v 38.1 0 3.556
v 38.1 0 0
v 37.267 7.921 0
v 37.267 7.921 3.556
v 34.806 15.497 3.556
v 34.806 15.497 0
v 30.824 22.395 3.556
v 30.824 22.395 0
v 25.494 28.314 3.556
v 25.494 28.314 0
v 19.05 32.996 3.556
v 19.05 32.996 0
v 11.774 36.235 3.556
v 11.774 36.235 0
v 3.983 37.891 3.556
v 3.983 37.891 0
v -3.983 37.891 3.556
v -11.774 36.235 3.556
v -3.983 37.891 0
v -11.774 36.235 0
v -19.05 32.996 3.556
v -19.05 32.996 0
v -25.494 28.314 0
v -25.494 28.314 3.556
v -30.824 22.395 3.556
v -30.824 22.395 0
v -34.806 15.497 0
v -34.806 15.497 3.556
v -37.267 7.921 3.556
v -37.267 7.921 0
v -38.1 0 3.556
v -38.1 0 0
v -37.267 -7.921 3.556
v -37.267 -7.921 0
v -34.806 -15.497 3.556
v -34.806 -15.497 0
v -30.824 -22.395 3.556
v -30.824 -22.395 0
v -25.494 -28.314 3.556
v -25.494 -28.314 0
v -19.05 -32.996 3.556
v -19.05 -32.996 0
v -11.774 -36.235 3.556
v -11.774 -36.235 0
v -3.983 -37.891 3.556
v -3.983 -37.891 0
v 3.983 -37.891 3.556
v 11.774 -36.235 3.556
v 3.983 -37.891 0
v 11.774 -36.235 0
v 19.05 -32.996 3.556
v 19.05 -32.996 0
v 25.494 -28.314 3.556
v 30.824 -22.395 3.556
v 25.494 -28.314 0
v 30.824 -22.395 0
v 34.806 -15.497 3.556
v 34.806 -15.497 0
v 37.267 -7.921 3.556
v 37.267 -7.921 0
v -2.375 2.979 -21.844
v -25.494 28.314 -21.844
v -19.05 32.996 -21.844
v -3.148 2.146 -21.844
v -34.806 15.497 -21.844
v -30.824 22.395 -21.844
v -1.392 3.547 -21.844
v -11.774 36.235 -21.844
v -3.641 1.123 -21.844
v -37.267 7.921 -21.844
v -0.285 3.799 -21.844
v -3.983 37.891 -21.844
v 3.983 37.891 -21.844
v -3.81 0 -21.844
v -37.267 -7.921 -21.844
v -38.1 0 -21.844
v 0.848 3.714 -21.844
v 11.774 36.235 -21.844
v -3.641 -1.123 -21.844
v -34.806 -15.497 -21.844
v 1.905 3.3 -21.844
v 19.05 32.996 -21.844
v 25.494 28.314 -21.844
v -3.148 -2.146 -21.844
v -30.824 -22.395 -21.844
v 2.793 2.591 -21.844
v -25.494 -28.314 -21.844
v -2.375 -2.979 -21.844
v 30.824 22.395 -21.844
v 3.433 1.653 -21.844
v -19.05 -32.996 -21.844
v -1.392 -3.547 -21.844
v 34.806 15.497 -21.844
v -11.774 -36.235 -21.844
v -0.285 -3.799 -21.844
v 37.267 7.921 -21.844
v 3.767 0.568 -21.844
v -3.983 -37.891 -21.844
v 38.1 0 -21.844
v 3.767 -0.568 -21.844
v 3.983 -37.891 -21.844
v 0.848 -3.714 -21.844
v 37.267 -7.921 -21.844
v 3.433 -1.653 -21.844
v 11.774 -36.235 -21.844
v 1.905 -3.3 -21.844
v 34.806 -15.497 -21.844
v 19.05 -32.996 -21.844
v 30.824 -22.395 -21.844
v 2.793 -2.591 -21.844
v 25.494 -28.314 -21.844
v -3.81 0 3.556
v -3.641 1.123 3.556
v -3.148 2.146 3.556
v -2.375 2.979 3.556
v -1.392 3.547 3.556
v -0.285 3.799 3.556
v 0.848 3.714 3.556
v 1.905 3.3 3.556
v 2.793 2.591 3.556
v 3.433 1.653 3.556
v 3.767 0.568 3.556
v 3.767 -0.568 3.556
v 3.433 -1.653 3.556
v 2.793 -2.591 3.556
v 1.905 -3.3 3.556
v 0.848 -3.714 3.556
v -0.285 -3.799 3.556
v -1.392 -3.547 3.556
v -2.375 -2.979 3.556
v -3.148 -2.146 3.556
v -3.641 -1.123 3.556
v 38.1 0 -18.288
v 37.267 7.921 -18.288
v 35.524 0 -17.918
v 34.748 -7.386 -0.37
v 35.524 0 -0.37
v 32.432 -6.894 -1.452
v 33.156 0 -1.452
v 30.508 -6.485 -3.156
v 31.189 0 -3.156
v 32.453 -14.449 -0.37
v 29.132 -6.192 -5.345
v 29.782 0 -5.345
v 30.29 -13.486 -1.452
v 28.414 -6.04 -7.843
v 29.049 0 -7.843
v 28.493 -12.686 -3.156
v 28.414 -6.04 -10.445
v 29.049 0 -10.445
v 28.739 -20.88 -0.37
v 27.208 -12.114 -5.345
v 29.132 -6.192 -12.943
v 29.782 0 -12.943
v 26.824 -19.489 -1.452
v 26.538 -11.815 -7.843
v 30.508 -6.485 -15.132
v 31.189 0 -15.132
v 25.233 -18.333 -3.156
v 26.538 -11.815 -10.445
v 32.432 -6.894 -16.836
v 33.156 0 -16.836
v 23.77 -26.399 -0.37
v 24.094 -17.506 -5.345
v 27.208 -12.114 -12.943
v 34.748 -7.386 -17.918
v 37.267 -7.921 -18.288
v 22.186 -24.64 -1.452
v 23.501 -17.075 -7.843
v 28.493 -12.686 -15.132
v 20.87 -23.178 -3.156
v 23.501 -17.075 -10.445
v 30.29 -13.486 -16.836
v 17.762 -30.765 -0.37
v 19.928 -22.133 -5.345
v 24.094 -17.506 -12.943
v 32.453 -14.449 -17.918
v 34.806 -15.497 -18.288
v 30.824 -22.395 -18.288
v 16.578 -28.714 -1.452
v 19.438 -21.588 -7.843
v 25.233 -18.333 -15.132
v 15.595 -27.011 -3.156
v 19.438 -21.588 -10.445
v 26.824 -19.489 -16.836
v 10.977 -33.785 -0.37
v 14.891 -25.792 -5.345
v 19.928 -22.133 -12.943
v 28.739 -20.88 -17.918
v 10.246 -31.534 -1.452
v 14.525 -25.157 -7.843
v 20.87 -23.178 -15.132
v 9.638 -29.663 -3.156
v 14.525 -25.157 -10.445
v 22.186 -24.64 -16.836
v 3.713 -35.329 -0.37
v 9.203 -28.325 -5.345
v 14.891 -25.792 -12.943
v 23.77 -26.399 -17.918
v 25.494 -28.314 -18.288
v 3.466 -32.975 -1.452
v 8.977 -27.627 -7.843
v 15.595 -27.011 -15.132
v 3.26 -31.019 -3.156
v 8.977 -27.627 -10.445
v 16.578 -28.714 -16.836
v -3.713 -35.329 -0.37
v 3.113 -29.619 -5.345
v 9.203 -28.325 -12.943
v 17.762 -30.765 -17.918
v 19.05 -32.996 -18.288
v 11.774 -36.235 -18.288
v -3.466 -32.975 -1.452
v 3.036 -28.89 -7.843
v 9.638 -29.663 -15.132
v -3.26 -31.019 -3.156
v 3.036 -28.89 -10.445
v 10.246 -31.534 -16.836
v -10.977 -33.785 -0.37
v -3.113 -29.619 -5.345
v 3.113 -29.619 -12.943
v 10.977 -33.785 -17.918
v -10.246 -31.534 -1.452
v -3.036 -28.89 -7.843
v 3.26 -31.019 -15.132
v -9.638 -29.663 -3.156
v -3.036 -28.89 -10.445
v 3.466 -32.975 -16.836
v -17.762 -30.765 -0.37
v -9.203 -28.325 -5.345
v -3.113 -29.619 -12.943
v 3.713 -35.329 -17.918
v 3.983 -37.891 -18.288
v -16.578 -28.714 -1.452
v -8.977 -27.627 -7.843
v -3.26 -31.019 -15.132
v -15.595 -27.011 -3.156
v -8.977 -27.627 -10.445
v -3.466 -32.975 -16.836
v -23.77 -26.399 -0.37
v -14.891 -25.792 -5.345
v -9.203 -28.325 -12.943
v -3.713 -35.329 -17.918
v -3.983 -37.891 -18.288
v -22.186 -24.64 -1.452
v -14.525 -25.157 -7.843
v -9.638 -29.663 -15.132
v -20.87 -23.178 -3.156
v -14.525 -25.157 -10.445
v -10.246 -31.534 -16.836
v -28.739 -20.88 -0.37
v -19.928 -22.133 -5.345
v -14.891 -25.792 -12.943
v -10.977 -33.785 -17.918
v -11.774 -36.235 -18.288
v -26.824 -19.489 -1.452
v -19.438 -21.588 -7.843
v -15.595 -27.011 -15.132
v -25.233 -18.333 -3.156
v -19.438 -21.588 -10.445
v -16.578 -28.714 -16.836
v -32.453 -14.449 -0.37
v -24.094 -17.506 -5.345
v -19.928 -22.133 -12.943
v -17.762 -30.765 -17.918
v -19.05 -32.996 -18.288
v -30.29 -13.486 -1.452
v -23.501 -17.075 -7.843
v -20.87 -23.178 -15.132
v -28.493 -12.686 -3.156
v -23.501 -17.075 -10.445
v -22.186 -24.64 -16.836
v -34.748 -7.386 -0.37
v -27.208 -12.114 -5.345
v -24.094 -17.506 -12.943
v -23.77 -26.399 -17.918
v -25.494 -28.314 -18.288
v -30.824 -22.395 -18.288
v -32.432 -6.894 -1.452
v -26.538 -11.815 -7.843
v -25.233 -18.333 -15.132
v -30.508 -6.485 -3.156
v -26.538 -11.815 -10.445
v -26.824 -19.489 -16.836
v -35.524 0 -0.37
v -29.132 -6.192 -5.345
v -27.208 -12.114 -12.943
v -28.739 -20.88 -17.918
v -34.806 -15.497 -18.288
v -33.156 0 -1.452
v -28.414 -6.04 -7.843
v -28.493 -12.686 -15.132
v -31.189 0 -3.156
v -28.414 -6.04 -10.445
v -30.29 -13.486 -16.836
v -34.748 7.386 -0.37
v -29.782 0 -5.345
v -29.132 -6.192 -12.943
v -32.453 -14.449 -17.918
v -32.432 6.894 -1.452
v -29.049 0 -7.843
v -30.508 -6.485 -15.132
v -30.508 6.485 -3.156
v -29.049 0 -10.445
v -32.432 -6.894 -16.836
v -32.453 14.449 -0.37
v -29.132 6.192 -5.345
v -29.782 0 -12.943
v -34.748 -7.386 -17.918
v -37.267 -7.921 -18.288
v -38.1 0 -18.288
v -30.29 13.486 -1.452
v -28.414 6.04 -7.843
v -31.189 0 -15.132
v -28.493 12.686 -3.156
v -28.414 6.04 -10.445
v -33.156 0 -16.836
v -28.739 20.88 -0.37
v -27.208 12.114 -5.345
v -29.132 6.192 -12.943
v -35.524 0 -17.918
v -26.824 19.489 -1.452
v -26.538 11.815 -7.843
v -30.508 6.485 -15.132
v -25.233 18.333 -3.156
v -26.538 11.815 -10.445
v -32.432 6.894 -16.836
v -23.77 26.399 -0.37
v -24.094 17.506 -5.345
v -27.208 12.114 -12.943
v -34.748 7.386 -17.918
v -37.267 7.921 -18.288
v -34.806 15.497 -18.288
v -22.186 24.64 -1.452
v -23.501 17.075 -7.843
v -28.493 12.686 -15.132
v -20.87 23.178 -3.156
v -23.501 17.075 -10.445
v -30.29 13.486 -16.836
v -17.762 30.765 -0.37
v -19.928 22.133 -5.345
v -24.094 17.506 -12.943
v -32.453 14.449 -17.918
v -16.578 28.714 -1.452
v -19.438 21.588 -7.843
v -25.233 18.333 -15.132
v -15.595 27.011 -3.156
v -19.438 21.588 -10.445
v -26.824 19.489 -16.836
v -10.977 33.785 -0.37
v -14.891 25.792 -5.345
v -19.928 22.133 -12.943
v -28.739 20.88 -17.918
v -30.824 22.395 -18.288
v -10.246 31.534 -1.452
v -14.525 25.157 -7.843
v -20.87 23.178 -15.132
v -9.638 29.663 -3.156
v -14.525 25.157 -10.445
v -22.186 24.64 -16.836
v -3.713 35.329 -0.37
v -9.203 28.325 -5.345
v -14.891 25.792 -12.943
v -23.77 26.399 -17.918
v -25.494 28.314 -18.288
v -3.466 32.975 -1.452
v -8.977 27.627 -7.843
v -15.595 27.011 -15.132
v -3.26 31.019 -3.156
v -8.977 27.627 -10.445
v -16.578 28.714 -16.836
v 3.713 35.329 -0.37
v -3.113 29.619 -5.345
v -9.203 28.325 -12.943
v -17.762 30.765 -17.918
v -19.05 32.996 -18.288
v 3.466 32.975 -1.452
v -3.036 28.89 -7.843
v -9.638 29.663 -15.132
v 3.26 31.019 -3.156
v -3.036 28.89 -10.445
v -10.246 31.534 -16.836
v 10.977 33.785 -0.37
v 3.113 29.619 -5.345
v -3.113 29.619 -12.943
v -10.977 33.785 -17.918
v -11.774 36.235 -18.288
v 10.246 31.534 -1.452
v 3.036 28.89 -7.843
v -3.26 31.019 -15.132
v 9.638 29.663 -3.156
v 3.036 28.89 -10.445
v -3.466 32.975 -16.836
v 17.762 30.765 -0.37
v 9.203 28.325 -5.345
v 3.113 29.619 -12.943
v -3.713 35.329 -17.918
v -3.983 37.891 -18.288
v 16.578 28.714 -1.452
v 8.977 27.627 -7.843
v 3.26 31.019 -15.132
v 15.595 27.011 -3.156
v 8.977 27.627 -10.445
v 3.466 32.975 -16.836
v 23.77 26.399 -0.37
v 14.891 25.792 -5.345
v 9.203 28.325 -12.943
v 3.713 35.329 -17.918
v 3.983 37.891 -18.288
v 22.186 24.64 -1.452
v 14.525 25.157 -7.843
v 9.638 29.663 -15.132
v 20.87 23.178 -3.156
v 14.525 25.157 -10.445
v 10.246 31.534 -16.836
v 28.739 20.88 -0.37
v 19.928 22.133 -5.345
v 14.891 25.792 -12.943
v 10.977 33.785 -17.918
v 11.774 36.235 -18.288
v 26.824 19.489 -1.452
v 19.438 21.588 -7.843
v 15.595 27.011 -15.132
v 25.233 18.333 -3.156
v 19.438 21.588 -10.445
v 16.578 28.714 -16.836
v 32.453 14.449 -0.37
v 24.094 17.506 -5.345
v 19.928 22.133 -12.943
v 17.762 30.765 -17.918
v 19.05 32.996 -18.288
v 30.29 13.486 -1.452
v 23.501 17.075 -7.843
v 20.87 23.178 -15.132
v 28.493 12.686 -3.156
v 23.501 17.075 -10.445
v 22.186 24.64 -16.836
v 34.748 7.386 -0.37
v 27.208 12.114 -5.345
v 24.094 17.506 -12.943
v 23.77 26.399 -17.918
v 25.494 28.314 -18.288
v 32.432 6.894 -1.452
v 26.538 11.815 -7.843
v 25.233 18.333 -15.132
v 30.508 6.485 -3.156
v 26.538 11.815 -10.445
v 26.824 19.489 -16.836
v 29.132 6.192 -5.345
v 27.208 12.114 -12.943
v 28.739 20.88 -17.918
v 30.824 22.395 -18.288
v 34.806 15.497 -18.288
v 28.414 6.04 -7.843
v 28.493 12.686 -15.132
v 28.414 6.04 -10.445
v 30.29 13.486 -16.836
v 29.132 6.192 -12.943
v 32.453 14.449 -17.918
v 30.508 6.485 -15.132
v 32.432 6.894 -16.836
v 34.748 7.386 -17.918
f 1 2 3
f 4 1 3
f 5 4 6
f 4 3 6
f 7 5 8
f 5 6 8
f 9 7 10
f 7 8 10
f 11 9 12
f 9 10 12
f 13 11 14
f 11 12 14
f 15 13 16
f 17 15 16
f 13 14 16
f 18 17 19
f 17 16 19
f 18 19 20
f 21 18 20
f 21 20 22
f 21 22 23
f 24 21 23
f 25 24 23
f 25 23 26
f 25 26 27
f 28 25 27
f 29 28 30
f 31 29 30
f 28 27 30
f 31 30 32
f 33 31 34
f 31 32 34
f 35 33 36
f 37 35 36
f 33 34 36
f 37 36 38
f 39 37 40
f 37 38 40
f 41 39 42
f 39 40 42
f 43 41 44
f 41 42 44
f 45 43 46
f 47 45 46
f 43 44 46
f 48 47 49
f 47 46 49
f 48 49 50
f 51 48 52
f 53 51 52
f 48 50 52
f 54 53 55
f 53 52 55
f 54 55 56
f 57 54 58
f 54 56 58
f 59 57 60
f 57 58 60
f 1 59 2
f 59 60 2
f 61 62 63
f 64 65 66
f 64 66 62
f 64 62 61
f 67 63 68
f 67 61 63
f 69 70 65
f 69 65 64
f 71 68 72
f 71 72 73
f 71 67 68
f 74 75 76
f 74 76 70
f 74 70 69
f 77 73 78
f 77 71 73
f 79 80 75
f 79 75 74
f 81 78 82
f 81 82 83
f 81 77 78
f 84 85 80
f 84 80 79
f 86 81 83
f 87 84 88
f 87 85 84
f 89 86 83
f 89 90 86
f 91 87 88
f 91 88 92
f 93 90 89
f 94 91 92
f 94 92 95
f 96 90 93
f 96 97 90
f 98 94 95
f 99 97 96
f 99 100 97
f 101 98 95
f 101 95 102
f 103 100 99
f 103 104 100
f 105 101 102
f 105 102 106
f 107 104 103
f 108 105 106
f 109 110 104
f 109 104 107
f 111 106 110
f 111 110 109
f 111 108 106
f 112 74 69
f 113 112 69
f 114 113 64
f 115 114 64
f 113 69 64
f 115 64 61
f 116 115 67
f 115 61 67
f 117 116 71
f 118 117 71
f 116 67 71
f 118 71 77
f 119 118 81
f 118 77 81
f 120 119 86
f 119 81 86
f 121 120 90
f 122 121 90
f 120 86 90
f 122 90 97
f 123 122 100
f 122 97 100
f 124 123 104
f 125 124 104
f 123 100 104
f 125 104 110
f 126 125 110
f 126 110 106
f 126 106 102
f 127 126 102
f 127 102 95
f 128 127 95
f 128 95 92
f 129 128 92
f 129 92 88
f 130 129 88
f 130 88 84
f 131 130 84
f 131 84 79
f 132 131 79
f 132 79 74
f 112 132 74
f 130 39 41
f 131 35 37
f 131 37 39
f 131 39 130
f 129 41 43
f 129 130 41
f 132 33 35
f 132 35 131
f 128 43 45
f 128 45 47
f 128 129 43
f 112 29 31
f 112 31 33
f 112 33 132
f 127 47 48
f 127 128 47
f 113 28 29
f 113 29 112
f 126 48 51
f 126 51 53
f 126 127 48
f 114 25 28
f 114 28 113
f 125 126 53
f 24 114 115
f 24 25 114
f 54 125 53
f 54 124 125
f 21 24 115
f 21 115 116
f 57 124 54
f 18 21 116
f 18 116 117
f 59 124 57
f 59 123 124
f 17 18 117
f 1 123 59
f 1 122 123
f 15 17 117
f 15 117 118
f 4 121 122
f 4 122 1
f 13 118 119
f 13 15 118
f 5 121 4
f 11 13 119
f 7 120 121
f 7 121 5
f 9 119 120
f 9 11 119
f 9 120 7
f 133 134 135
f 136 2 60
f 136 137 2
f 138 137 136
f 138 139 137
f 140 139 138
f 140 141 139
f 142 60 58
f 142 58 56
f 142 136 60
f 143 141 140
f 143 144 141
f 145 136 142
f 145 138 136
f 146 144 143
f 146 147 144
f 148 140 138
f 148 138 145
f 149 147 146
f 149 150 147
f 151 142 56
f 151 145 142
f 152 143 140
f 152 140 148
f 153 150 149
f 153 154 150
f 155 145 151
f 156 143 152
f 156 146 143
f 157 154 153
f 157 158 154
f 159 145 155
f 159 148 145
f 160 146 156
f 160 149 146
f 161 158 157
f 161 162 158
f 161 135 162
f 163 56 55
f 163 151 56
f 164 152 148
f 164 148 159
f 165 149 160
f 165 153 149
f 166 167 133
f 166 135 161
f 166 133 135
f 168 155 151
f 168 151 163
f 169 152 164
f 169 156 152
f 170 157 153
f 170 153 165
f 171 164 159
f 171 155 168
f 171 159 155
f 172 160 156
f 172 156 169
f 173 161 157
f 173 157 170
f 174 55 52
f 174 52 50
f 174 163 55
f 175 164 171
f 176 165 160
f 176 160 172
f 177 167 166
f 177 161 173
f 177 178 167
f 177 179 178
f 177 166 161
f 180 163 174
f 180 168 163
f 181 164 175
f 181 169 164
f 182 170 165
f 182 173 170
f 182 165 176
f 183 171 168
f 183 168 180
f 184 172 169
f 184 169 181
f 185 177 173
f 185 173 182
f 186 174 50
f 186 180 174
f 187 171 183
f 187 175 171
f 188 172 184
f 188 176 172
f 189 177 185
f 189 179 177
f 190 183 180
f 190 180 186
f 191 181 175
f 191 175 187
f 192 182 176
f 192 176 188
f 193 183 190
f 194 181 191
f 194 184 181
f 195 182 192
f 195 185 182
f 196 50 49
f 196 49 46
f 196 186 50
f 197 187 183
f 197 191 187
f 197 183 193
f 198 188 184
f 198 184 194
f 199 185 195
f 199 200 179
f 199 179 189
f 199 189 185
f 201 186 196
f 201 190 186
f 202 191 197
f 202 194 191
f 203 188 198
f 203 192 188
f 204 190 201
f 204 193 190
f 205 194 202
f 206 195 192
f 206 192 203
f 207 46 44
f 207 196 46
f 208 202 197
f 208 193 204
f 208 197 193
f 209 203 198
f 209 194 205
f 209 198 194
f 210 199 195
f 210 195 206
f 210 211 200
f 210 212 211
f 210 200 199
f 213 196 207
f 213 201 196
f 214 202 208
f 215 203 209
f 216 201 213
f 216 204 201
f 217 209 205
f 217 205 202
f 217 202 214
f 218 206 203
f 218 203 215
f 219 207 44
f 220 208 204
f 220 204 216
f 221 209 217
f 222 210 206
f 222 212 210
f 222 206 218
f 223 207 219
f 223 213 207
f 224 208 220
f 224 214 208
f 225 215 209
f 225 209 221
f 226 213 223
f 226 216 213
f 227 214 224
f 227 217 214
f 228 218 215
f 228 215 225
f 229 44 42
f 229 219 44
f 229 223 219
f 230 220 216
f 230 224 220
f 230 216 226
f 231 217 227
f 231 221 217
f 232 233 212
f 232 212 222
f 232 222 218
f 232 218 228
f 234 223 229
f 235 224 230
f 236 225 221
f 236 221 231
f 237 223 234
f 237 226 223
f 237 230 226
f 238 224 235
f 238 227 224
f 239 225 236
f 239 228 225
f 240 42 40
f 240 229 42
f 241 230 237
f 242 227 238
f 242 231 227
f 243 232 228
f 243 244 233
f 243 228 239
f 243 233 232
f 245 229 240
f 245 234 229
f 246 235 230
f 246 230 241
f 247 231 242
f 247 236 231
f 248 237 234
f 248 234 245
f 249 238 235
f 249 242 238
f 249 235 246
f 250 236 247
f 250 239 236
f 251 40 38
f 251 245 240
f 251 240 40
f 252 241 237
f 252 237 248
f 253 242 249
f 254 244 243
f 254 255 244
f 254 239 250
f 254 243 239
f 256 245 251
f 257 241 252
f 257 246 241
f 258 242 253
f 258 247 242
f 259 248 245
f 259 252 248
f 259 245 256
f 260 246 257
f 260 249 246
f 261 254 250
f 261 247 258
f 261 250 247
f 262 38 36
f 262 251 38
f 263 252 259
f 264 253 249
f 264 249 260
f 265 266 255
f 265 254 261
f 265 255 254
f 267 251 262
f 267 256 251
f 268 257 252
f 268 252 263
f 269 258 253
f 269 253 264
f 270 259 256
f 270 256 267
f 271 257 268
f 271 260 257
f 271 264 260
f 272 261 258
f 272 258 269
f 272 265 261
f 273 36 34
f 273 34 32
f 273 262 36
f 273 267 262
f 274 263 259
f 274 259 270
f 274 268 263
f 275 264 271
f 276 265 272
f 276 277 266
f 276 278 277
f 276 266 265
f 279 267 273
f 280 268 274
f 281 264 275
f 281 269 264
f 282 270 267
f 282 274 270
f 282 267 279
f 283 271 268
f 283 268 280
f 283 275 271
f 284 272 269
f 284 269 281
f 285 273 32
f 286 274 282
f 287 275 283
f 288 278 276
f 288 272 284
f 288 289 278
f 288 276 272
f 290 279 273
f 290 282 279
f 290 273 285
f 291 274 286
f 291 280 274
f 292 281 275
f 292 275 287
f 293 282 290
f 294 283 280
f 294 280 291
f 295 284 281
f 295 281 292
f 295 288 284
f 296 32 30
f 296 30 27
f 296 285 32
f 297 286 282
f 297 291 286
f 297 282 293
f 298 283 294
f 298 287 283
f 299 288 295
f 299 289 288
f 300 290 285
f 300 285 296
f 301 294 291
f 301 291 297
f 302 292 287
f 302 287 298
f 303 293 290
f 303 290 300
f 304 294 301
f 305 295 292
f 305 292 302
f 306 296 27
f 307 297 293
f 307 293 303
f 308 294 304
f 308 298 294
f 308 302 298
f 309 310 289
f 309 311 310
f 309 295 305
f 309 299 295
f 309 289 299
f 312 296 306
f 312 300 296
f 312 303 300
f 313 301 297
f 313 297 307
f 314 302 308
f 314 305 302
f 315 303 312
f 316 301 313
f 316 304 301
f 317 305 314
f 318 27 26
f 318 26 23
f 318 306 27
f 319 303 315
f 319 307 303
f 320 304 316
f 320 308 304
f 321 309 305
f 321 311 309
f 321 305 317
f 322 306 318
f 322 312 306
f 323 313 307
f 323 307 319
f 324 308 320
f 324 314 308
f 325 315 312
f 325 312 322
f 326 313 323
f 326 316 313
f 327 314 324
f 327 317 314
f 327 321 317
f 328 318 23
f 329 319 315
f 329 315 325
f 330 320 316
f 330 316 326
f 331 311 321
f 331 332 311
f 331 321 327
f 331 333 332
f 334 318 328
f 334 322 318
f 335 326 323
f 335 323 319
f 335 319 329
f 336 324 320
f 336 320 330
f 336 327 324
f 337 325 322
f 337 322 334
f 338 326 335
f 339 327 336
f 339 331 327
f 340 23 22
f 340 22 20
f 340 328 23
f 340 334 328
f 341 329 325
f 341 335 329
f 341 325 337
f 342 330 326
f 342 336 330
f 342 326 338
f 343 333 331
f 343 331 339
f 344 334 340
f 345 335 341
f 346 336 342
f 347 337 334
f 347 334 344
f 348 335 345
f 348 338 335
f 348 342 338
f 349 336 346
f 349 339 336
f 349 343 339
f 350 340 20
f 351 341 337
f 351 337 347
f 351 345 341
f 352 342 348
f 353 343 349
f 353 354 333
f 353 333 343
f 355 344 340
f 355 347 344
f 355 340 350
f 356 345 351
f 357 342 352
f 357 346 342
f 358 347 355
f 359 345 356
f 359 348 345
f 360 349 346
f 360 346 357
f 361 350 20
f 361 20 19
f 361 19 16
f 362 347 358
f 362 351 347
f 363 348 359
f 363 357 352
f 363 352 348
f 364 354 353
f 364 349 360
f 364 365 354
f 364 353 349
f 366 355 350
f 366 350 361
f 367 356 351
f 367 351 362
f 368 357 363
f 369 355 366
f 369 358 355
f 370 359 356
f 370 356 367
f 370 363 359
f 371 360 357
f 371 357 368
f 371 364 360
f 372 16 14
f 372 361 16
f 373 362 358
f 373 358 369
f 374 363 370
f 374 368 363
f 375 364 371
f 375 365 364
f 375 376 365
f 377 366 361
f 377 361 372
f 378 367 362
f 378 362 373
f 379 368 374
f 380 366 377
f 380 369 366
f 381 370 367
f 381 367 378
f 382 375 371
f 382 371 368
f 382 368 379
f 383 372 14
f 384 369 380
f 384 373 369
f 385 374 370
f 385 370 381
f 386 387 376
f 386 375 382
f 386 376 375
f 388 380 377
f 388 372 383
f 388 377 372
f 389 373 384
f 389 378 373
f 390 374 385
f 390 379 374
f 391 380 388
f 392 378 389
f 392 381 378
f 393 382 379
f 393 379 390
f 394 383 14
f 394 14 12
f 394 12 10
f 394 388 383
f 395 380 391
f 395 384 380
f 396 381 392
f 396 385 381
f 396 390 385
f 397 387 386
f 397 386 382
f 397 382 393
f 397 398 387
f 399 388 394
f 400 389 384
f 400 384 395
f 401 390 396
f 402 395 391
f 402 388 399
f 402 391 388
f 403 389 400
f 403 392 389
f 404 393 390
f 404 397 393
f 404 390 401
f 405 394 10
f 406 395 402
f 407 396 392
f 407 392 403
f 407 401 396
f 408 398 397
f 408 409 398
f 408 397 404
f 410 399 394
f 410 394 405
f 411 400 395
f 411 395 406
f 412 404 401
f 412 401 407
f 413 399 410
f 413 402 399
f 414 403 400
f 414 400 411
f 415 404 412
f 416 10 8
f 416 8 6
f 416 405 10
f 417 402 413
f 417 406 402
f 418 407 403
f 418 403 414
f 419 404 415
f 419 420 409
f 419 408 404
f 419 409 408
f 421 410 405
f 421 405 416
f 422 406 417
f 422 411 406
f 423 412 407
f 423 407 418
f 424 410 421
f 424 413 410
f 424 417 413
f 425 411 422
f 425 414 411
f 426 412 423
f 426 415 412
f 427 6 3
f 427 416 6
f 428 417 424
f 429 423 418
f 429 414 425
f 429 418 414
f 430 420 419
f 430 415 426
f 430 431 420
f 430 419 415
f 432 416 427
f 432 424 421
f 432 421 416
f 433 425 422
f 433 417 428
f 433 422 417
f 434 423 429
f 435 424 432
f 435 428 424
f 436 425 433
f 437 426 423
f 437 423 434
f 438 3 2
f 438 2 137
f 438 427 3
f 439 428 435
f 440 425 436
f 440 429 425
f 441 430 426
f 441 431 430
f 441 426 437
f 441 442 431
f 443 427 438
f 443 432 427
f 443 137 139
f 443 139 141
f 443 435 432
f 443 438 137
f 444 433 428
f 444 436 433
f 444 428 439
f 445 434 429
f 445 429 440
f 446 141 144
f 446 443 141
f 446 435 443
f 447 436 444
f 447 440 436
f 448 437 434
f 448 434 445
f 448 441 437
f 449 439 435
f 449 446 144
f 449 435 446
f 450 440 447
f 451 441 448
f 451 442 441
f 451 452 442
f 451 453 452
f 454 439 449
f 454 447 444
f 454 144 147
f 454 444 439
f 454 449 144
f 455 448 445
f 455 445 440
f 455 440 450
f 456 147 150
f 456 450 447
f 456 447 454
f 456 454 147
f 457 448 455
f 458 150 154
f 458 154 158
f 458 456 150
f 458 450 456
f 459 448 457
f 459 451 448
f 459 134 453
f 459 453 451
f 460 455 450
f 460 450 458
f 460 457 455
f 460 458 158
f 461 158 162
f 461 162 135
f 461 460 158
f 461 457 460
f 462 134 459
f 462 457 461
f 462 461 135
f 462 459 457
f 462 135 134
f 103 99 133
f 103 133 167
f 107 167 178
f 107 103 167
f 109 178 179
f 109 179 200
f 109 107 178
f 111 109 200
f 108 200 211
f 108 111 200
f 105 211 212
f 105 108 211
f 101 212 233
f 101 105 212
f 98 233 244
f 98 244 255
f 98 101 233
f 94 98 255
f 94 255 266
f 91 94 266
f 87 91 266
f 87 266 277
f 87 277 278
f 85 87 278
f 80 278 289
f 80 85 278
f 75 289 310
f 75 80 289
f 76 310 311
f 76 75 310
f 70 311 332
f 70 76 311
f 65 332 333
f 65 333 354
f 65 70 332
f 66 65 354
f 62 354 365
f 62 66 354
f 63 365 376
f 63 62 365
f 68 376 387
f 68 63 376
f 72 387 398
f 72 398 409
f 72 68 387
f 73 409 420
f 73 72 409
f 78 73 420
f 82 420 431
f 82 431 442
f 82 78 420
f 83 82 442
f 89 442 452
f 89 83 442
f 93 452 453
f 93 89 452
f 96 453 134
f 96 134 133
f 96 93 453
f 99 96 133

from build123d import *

# Parameters (mm, degrees)
SKETCH9_R                  = 38.1
BOSS_EXTRUDE2_DEPTH        = 3.556
BOSS_EXTRUDE3_START        = 3.556
SKETCH10_R                 = 38.1
BOSS_EXTRUDE3_DEPTH        = 3.556
F_3_4_0_3_DIAMETER_HOLE1_D = 7.62


with BuildPart() as part:
    # Sketch5 → Revolve1 (revolve)
    with BuildSketch(Plane(origin=(0, 0, 0), x_dir=(1, 0, 0), z_dir=(0, 1, 0)), mode=Mode.PRIVATE) as revolve1_sk:
        with BuildLine():
            Line((0, 0), (-38.1, 0))
            ThreePointArc((-38.1, 0), (-28.956, 9.144), (-38.1, 18.288))
            Line((-38.1, 18.288), (0, 18.288))
            Line((0, 18.288), (0, 0))
        make_face()
    revolve(revolve1_sk.sketch.rotate(Axis((0, 0, 0), (0, 0, -1)), 180), axis=Axis((0, 0, 0), (0, 0, -1)))

    # Sketch9 → Boss-Extrude2 (add)
    with BuildSketch(Plane.XY):
        Circle(SKETCH9_R)
    extrude(amount=BOSS_EXTRUDE2_DEPTH)

    # Sketch10 → Boss-Extrude3 (add)
    with BuildSketch(Plane(origin=(0, 0, -18.288), x_dir=(-1, 0, 0), z_dir=(0, 0, -1)).offset(BOSS_EXTRUDE3_START)):
        with Locations(Location((0, 0, 0), (0, 0, 180))):
            Circle(SKETCH10_R)
    extrude(amount=-BOSS_EXTRUDE3_DEPTH)

    # 3/4 (0.3) Diameter Hole1 (through all)
    with Locations(Plane.XY.offset(3.556)):
        with Locations((0, 0)):
            Hole(F_3_4_0_3_DIAMETER_HOLE1_D / 2)


solid = part.part
